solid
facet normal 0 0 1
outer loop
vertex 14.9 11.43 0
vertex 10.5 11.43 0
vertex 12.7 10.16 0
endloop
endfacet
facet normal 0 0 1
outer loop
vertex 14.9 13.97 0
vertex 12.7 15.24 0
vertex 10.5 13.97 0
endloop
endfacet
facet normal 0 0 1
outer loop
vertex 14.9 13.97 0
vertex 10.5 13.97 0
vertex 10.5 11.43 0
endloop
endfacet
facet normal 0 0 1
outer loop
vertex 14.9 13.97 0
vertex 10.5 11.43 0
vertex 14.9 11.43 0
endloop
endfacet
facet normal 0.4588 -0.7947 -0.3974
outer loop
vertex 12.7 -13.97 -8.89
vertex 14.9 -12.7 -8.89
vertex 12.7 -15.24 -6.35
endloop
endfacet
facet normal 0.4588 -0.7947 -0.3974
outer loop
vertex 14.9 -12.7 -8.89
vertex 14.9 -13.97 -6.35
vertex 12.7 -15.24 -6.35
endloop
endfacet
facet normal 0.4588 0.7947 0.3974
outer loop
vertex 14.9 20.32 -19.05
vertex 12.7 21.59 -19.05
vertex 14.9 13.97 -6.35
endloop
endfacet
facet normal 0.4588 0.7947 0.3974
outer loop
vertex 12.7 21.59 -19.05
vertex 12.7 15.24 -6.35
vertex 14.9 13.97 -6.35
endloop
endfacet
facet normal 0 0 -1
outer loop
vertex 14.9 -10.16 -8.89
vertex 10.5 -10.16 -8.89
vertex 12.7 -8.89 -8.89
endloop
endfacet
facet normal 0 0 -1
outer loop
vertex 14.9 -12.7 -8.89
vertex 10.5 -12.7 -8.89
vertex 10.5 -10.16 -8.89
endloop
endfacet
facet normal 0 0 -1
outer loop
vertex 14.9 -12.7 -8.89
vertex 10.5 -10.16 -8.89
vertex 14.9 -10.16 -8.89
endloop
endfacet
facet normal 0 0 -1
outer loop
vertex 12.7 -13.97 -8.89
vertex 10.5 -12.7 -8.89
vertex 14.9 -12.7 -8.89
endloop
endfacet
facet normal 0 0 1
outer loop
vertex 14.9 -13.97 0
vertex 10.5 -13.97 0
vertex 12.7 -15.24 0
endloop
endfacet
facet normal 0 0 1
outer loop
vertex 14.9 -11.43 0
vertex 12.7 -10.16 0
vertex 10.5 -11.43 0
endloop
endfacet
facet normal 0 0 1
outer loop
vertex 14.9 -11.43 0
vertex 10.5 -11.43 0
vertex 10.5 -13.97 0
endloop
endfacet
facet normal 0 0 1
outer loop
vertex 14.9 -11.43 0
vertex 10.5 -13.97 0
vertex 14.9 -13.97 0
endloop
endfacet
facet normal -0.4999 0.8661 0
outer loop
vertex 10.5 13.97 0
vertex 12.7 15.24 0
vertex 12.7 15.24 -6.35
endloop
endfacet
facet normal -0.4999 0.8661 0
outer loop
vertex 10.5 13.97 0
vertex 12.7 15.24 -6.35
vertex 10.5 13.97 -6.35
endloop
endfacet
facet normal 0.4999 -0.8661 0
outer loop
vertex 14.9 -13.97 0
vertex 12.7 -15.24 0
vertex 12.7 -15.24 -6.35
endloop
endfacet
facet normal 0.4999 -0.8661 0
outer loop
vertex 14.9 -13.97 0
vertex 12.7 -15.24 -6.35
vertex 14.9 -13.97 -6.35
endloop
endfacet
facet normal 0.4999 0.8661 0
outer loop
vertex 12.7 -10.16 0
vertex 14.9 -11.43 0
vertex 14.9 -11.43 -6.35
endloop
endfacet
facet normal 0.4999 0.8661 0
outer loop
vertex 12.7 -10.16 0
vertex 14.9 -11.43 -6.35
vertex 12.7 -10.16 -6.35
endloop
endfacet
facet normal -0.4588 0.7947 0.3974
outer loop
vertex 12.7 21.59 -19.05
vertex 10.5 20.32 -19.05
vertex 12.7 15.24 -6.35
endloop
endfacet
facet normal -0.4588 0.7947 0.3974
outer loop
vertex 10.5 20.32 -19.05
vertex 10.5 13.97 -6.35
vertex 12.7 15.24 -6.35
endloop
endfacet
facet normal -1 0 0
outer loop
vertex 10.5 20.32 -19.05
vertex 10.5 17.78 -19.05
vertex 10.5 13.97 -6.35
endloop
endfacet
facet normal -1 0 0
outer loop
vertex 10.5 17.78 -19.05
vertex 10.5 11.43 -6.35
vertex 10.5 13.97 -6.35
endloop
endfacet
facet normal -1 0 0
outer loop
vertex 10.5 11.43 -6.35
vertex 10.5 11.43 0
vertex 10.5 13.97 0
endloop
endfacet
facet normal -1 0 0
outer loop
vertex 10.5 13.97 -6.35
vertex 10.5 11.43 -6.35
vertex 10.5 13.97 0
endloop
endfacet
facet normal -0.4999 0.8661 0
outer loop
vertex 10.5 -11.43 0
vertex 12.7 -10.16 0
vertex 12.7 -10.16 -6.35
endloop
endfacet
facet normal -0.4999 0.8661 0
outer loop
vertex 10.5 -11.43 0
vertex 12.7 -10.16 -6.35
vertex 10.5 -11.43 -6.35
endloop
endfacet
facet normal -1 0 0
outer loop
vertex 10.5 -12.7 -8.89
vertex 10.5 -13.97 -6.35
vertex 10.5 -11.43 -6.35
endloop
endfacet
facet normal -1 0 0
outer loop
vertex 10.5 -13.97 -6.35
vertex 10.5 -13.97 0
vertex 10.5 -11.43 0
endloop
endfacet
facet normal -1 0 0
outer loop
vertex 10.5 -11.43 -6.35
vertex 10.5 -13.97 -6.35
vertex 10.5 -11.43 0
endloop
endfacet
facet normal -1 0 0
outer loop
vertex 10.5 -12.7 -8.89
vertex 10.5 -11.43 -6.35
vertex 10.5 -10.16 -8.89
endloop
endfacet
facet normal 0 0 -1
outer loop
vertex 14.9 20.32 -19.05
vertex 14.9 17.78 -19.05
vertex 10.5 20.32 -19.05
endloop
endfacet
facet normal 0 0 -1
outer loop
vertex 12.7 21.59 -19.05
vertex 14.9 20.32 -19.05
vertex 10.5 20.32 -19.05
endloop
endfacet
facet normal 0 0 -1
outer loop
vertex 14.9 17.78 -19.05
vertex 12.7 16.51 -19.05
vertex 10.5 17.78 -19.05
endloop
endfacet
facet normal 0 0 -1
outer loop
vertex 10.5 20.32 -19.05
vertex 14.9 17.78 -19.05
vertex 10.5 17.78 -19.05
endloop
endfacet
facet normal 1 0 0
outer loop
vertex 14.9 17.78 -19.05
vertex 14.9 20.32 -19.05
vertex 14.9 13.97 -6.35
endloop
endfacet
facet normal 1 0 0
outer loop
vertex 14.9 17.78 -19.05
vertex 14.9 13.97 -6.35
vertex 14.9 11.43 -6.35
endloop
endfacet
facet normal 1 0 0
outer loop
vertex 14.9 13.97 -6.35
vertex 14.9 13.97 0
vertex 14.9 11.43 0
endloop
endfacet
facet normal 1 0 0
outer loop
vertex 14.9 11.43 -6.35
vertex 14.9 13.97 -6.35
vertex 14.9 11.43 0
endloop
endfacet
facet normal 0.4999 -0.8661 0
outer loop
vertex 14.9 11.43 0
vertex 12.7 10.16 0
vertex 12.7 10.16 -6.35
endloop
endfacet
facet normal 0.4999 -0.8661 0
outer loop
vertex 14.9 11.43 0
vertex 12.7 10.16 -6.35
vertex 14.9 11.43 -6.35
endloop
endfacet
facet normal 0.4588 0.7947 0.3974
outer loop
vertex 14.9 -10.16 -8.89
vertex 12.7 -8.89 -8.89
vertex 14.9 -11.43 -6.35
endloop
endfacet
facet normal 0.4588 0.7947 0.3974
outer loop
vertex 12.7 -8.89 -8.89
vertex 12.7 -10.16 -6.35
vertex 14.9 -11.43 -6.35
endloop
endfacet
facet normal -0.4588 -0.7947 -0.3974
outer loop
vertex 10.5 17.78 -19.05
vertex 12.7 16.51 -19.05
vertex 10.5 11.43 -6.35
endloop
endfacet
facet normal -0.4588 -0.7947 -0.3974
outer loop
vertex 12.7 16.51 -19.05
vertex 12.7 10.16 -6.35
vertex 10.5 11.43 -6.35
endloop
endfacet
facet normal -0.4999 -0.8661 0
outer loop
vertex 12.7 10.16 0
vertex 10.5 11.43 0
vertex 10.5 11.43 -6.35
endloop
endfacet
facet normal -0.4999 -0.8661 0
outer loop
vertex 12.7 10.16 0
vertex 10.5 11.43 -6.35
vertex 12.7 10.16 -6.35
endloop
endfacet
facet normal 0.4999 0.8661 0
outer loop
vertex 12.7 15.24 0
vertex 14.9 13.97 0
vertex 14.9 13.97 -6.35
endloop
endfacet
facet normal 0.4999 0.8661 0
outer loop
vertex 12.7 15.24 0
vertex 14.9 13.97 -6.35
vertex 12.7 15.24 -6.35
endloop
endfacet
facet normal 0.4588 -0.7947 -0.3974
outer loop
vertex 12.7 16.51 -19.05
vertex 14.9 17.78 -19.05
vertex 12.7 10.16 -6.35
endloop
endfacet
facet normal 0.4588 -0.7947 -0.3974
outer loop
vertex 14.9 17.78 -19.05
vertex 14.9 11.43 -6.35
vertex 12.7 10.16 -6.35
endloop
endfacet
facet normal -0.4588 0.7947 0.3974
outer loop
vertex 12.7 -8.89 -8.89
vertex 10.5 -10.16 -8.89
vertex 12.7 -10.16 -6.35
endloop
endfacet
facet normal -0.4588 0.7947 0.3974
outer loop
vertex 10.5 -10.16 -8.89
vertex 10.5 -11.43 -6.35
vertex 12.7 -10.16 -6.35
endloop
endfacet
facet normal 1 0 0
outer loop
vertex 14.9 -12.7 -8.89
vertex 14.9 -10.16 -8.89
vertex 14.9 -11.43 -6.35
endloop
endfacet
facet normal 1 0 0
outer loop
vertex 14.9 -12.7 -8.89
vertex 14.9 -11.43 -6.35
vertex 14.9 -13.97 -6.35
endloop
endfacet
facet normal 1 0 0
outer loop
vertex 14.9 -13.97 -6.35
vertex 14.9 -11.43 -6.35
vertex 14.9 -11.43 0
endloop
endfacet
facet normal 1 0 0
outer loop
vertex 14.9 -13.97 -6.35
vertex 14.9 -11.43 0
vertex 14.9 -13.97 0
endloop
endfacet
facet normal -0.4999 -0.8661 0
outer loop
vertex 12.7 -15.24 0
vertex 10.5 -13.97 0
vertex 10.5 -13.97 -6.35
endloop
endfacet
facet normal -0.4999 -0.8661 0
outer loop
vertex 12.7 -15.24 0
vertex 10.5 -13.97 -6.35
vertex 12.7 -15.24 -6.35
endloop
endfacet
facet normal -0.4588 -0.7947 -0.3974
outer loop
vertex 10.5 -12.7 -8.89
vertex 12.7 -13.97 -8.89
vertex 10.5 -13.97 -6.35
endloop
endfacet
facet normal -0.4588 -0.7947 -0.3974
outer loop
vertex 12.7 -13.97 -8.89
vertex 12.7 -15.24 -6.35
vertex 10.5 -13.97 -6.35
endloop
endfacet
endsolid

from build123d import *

# Parameters (mm, degrees)
F1_DEPTH = 6.35


with BuildPart() as f1:
    # F0 (on Top) → F1 (new body)
    with BuildSketch(Plane.XY):
        Polygon((10.5002954744, 12.7), (12.7, 12.7), (12.7, 10.16), (14.8997045256, 11.43), (14.8997045256, 13.97), (12.7, 15.24), (10.5002954744, 13.97), align=None)
        Polygon((12.7, 10.16), (12.7, 12.7), (10.5002954744, 12.7), (10.5002954744, 11.43), align=None)
    extrude(amount=-F1_DEPTH)

    # F6 (on offset) → F7 section 0
    with BuildSketch(Plane(origin=(0, 0, -19.05), x_dir=(1, 0, 0), z_dir=(0, 0, -1))):
        Polygon((14.8997045256, -17.78), (12.7, -16.51), (10.5002954744, -17.78), (10.5002954744, -20.32), (12.7, -21.59), (14.8997045256, -20.32), align=None)
    # F1_face (on face) → F7 section 1
    with BuildSketch(Plane(origin=(12.7, -12.7, -6.35), x_dir=(1, 0, 0), z_dir=(0, 0, -1))):
        Polygon((-2.1997045256, -24.13), (-2.1997045256, -26.67), (0, -27.94), (2.1997045256, -26.67), (2.1997045256, -24.13), (0, -22.86), align=None)
    loft()


with BuildPart() as f1b:
    # F0 (on Top) → F1, piece 2 (new body)
    with BuildSketch(Plane.XY):
        Polygon((12.7, -12.7), (12.7, -10.16), (10.5002954744, -11.43), (10.5002954744, -12.7), align=None)
        Polygon((14.8997045256, -11.43), (12.7, -10.16), (12.7, -12.7), (10.5002954744, -12.7), (10.5002954744, -13.97), (12.7, -15.24), (14.8997045256, -13.97), align=None)
    extrude(amount=-F1_DEPTH)

    # F3 (on offset) → F4 section 0
    with BuildSketch(Plane(origin=(0, 0, -8.89), x_dir=(1, 0, 0), z_dir=(0, 0, -1))):
        Polygon((10.5002954744, 10.16), (12.7, 8.89), (14.8997045256, 10.16), (14.8997045256, 12.7), (12.7, 13.97), (10.5002954744, 12.7), align=None)
    # F1_face (on face) → F4 section 1
    with BuildSketch(Plane(origin=(12.7, -12.7, -6.35), x_dir=(1, 0, 0), z_dir=(0, 0, -1))):
        Polygon((-2.1997045256, -1.27), (0, -2.54), (2.1997045256, -1.27), (2.1997045256, 1.27), (0, 2.54), (-2.1997045256, 1.27), align=None)
    loft()


solid = Compound([f1.part, f1b.part])
